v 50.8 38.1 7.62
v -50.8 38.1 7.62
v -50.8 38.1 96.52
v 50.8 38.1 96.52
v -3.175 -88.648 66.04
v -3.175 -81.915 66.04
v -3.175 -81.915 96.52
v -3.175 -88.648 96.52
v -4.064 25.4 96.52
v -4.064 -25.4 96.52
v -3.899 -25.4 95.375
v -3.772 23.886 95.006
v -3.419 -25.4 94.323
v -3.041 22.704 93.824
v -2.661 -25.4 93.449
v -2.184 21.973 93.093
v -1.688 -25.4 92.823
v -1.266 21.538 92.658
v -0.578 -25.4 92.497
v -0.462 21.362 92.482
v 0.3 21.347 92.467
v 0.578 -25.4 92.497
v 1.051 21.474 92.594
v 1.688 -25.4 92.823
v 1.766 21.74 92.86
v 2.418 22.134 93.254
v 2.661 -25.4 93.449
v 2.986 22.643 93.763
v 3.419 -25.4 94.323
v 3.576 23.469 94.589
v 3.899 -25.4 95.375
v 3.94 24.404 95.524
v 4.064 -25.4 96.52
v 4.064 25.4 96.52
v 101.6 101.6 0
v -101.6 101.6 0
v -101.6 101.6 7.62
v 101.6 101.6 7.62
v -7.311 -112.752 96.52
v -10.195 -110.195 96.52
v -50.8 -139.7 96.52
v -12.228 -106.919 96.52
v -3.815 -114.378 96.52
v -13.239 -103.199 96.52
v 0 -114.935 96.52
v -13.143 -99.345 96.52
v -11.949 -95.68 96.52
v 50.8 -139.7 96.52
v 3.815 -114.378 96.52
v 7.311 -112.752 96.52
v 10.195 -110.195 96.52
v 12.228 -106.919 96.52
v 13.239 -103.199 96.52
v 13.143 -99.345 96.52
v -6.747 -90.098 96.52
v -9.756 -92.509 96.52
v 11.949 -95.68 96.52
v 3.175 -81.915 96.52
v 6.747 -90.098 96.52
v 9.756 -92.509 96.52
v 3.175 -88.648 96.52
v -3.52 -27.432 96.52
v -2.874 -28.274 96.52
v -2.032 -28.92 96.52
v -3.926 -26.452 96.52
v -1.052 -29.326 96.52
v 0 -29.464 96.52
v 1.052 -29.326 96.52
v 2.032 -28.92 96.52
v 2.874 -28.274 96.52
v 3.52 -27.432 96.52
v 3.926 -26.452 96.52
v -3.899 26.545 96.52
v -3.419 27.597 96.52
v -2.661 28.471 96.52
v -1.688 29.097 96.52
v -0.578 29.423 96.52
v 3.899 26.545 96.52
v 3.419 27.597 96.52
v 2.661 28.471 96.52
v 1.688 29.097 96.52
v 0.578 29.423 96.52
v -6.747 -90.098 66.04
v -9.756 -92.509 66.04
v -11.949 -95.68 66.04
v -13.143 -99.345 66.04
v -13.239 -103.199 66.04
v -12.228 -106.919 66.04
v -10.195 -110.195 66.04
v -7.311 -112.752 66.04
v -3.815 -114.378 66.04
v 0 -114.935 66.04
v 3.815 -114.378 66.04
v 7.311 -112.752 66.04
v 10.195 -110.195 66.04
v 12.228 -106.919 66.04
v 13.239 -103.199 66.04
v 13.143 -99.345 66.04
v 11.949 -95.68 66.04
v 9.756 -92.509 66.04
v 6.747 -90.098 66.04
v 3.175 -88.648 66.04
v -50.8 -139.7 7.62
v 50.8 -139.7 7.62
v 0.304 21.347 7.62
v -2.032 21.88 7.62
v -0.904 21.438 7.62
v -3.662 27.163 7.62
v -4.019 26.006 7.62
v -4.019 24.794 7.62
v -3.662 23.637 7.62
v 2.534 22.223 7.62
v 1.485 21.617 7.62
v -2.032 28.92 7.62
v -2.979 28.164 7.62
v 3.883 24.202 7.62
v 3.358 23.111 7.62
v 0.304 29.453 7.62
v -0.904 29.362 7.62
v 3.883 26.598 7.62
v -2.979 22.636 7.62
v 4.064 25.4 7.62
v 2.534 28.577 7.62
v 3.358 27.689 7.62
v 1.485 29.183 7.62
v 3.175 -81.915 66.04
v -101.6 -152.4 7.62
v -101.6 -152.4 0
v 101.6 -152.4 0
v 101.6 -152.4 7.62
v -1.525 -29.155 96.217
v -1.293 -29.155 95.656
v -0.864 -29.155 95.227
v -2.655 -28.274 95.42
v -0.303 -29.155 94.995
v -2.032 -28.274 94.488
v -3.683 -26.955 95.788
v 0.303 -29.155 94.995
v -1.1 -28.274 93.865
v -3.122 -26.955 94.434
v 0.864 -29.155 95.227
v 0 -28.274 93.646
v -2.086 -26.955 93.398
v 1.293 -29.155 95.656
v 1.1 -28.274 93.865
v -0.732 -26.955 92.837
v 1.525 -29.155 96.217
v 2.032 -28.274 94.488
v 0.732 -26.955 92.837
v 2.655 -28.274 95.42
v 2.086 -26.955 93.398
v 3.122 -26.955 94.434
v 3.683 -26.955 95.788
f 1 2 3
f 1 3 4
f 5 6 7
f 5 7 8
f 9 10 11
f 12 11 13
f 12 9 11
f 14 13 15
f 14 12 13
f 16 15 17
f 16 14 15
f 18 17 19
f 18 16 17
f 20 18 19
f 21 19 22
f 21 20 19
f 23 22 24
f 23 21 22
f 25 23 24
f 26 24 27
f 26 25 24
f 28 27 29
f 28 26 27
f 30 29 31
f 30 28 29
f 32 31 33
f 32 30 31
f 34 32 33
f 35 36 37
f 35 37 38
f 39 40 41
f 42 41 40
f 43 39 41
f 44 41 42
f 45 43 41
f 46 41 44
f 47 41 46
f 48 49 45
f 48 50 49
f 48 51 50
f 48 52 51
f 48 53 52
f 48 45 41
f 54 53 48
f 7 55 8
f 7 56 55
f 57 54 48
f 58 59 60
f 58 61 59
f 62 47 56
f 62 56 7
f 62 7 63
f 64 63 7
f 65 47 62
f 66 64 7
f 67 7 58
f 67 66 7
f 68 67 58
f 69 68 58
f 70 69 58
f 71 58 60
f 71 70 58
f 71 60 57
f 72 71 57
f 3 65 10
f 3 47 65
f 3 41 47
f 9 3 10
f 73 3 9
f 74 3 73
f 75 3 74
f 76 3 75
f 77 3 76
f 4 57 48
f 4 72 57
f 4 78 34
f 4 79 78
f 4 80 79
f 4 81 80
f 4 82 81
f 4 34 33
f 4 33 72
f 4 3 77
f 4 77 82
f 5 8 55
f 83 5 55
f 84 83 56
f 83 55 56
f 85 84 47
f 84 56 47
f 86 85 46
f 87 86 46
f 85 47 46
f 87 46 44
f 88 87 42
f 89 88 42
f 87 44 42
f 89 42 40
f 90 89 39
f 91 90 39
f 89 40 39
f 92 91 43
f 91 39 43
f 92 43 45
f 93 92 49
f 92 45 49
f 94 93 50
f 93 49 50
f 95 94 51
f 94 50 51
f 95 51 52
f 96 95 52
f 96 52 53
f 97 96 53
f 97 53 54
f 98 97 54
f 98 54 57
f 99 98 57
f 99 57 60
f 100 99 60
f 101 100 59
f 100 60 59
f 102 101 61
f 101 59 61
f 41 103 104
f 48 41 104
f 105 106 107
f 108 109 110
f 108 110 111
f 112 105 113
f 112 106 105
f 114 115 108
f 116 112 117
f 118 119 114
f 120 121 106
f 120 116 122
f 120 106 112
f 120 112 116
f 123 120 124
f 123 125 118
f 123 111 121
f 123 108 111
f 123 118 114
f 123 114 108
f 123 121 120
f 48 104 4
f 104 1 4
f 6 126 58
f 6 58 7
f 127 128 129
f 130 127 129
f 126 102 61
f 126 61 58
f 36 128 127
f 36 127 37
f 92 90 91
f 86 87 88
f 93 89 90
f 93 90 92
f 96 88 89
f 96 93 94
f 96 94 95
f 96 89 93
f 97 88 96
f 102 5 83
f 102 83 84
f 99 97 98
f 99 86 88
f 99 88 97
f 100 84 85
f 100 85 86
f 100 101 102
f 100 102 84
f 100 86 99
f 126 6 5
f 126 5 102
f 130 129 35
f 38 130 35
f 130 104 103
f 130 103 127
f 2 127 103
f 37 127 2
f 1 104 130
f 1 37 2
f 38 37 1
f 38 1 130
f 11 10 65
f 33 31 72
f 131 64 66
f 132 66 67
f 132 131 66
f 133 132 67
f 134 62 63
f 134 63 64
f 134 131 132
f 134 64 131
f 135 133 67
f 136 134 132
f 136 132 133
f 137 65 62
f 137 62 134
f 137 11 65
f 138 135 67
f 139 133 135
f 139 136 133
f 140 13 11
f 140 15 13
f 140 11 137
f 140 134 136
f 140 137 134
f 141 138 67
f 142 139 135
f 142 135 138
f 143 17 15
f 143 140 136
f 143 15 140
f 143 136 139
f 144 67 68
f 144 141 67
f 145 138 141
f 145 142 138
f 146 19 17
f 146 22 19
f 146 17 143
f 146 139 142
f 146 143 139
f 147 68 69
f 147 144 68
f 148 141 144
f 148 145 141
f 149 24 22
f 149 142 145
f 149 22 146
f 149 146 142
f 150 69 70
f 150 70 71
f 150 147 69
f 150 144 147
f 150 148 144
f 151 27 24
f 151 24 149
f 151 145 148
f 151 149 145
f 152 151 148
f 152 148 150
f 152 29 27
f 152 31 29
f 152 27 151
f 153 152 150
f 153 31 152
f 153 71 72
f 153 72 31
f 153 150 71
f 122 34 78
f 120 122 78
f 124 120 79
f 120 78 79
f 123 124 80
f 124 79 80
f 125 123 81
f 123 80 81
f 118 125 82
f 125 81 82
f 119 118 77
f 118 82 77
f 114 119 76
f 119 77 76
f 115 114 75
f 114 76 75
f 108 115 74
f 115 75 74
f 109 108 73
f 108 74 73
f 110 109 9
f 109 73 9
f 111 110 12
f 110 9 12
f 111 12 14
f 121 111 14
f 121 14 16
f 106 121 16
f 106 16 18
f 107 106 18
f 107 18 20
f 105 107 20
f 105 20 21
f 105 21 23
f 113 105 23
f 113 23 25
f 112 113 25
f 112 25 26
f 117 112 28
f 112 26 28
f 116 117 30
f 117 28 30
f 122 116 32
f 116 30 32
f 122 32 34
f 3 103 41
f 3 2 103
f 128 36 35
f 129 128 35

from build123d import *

# Parameters (mm, degrees)
F0_W      = 203.2
F0_H      = 254
F1_DEPTH  = 7.62
F2_W      = 101.6
F2_H      = 76.2
F3_DEPTH  = 88.9
F4_R      = 4.064
F5_DEPTH  = 88.9
F8_DEPTH  = 101.6
F10_DEPTH = 30.48


with BuildPart() as f1:
    # F0 (on Top) → F1 (new body)
    with BuildSketch(Plane.XY):
        with Locations((0, -25.4)):
            Rectangle(F0_W, F0_H)
    extrude(amount=F1_DEPTH)

    # F2 (on face) → F3 (join)
    with BuildSketch(Plane.XY.offset(7.62)):
        Rectangle(F2_W, F2_H)
    extrude(amount=F3_DEPTH)

    # F4 (on face) → F5 (cut)
    with BuildSketch(Plane.XY.offset(96.52)):
        with Locations((0, 25.4)):
            Circle(F4_R)
    extrude(amount=-F5_DEPTH, mode=Mode.SUBTRACT)

    # F6 (on face) → F7 (revolve, cut)
    with BuildSketch(Plane.XY.offset(96.52)):
        with BuildLine():
            ThreePointArc((0, -29.464), (2.8736819587, -28.2736819587), (4.064, -25.4))
            Line((4.064, -25.4), (4.064, 25.4))
            ThreePointArc((4.064, 25.4), (2.8736819587, 22.5263180413), (0, 21.336))
            Line((0, 21.336), (0, -29.464))
        make_face()
    revolve(axis=Axis((0, 0, 96.52), (0, -1, 0)), mode=Mode.SUBTRACT)

    # F8 (add): a face of the model
    f8_faces = [f1.faces().sort_by_distance(p)[0] for p in [
        (0, -38.1, 52.07),
    ]]
    extrude(f8_faces, amount=F8_DEPTH)

    # F9 (on face) → F10 (cut)
    with BuildSketch(Plane.XY.offset(96.52)):
        with BuildLine():
            Line((-3.175, -81.915), (-3.175, -88.6484904355))
            ThreePointArc((-3.175, -88.6484904355), (0, -114.935), (3.175, -88.6484904355))
            Line((3.175, -88.6484904355), (3.175, -81.915))
            Line((3.175, -81.915), (-3.175, -81.915))
        make_face()
    extrude(amount=-F10_DEPTH, mode=Mode.SUBTRACT)


solid = f1.part
